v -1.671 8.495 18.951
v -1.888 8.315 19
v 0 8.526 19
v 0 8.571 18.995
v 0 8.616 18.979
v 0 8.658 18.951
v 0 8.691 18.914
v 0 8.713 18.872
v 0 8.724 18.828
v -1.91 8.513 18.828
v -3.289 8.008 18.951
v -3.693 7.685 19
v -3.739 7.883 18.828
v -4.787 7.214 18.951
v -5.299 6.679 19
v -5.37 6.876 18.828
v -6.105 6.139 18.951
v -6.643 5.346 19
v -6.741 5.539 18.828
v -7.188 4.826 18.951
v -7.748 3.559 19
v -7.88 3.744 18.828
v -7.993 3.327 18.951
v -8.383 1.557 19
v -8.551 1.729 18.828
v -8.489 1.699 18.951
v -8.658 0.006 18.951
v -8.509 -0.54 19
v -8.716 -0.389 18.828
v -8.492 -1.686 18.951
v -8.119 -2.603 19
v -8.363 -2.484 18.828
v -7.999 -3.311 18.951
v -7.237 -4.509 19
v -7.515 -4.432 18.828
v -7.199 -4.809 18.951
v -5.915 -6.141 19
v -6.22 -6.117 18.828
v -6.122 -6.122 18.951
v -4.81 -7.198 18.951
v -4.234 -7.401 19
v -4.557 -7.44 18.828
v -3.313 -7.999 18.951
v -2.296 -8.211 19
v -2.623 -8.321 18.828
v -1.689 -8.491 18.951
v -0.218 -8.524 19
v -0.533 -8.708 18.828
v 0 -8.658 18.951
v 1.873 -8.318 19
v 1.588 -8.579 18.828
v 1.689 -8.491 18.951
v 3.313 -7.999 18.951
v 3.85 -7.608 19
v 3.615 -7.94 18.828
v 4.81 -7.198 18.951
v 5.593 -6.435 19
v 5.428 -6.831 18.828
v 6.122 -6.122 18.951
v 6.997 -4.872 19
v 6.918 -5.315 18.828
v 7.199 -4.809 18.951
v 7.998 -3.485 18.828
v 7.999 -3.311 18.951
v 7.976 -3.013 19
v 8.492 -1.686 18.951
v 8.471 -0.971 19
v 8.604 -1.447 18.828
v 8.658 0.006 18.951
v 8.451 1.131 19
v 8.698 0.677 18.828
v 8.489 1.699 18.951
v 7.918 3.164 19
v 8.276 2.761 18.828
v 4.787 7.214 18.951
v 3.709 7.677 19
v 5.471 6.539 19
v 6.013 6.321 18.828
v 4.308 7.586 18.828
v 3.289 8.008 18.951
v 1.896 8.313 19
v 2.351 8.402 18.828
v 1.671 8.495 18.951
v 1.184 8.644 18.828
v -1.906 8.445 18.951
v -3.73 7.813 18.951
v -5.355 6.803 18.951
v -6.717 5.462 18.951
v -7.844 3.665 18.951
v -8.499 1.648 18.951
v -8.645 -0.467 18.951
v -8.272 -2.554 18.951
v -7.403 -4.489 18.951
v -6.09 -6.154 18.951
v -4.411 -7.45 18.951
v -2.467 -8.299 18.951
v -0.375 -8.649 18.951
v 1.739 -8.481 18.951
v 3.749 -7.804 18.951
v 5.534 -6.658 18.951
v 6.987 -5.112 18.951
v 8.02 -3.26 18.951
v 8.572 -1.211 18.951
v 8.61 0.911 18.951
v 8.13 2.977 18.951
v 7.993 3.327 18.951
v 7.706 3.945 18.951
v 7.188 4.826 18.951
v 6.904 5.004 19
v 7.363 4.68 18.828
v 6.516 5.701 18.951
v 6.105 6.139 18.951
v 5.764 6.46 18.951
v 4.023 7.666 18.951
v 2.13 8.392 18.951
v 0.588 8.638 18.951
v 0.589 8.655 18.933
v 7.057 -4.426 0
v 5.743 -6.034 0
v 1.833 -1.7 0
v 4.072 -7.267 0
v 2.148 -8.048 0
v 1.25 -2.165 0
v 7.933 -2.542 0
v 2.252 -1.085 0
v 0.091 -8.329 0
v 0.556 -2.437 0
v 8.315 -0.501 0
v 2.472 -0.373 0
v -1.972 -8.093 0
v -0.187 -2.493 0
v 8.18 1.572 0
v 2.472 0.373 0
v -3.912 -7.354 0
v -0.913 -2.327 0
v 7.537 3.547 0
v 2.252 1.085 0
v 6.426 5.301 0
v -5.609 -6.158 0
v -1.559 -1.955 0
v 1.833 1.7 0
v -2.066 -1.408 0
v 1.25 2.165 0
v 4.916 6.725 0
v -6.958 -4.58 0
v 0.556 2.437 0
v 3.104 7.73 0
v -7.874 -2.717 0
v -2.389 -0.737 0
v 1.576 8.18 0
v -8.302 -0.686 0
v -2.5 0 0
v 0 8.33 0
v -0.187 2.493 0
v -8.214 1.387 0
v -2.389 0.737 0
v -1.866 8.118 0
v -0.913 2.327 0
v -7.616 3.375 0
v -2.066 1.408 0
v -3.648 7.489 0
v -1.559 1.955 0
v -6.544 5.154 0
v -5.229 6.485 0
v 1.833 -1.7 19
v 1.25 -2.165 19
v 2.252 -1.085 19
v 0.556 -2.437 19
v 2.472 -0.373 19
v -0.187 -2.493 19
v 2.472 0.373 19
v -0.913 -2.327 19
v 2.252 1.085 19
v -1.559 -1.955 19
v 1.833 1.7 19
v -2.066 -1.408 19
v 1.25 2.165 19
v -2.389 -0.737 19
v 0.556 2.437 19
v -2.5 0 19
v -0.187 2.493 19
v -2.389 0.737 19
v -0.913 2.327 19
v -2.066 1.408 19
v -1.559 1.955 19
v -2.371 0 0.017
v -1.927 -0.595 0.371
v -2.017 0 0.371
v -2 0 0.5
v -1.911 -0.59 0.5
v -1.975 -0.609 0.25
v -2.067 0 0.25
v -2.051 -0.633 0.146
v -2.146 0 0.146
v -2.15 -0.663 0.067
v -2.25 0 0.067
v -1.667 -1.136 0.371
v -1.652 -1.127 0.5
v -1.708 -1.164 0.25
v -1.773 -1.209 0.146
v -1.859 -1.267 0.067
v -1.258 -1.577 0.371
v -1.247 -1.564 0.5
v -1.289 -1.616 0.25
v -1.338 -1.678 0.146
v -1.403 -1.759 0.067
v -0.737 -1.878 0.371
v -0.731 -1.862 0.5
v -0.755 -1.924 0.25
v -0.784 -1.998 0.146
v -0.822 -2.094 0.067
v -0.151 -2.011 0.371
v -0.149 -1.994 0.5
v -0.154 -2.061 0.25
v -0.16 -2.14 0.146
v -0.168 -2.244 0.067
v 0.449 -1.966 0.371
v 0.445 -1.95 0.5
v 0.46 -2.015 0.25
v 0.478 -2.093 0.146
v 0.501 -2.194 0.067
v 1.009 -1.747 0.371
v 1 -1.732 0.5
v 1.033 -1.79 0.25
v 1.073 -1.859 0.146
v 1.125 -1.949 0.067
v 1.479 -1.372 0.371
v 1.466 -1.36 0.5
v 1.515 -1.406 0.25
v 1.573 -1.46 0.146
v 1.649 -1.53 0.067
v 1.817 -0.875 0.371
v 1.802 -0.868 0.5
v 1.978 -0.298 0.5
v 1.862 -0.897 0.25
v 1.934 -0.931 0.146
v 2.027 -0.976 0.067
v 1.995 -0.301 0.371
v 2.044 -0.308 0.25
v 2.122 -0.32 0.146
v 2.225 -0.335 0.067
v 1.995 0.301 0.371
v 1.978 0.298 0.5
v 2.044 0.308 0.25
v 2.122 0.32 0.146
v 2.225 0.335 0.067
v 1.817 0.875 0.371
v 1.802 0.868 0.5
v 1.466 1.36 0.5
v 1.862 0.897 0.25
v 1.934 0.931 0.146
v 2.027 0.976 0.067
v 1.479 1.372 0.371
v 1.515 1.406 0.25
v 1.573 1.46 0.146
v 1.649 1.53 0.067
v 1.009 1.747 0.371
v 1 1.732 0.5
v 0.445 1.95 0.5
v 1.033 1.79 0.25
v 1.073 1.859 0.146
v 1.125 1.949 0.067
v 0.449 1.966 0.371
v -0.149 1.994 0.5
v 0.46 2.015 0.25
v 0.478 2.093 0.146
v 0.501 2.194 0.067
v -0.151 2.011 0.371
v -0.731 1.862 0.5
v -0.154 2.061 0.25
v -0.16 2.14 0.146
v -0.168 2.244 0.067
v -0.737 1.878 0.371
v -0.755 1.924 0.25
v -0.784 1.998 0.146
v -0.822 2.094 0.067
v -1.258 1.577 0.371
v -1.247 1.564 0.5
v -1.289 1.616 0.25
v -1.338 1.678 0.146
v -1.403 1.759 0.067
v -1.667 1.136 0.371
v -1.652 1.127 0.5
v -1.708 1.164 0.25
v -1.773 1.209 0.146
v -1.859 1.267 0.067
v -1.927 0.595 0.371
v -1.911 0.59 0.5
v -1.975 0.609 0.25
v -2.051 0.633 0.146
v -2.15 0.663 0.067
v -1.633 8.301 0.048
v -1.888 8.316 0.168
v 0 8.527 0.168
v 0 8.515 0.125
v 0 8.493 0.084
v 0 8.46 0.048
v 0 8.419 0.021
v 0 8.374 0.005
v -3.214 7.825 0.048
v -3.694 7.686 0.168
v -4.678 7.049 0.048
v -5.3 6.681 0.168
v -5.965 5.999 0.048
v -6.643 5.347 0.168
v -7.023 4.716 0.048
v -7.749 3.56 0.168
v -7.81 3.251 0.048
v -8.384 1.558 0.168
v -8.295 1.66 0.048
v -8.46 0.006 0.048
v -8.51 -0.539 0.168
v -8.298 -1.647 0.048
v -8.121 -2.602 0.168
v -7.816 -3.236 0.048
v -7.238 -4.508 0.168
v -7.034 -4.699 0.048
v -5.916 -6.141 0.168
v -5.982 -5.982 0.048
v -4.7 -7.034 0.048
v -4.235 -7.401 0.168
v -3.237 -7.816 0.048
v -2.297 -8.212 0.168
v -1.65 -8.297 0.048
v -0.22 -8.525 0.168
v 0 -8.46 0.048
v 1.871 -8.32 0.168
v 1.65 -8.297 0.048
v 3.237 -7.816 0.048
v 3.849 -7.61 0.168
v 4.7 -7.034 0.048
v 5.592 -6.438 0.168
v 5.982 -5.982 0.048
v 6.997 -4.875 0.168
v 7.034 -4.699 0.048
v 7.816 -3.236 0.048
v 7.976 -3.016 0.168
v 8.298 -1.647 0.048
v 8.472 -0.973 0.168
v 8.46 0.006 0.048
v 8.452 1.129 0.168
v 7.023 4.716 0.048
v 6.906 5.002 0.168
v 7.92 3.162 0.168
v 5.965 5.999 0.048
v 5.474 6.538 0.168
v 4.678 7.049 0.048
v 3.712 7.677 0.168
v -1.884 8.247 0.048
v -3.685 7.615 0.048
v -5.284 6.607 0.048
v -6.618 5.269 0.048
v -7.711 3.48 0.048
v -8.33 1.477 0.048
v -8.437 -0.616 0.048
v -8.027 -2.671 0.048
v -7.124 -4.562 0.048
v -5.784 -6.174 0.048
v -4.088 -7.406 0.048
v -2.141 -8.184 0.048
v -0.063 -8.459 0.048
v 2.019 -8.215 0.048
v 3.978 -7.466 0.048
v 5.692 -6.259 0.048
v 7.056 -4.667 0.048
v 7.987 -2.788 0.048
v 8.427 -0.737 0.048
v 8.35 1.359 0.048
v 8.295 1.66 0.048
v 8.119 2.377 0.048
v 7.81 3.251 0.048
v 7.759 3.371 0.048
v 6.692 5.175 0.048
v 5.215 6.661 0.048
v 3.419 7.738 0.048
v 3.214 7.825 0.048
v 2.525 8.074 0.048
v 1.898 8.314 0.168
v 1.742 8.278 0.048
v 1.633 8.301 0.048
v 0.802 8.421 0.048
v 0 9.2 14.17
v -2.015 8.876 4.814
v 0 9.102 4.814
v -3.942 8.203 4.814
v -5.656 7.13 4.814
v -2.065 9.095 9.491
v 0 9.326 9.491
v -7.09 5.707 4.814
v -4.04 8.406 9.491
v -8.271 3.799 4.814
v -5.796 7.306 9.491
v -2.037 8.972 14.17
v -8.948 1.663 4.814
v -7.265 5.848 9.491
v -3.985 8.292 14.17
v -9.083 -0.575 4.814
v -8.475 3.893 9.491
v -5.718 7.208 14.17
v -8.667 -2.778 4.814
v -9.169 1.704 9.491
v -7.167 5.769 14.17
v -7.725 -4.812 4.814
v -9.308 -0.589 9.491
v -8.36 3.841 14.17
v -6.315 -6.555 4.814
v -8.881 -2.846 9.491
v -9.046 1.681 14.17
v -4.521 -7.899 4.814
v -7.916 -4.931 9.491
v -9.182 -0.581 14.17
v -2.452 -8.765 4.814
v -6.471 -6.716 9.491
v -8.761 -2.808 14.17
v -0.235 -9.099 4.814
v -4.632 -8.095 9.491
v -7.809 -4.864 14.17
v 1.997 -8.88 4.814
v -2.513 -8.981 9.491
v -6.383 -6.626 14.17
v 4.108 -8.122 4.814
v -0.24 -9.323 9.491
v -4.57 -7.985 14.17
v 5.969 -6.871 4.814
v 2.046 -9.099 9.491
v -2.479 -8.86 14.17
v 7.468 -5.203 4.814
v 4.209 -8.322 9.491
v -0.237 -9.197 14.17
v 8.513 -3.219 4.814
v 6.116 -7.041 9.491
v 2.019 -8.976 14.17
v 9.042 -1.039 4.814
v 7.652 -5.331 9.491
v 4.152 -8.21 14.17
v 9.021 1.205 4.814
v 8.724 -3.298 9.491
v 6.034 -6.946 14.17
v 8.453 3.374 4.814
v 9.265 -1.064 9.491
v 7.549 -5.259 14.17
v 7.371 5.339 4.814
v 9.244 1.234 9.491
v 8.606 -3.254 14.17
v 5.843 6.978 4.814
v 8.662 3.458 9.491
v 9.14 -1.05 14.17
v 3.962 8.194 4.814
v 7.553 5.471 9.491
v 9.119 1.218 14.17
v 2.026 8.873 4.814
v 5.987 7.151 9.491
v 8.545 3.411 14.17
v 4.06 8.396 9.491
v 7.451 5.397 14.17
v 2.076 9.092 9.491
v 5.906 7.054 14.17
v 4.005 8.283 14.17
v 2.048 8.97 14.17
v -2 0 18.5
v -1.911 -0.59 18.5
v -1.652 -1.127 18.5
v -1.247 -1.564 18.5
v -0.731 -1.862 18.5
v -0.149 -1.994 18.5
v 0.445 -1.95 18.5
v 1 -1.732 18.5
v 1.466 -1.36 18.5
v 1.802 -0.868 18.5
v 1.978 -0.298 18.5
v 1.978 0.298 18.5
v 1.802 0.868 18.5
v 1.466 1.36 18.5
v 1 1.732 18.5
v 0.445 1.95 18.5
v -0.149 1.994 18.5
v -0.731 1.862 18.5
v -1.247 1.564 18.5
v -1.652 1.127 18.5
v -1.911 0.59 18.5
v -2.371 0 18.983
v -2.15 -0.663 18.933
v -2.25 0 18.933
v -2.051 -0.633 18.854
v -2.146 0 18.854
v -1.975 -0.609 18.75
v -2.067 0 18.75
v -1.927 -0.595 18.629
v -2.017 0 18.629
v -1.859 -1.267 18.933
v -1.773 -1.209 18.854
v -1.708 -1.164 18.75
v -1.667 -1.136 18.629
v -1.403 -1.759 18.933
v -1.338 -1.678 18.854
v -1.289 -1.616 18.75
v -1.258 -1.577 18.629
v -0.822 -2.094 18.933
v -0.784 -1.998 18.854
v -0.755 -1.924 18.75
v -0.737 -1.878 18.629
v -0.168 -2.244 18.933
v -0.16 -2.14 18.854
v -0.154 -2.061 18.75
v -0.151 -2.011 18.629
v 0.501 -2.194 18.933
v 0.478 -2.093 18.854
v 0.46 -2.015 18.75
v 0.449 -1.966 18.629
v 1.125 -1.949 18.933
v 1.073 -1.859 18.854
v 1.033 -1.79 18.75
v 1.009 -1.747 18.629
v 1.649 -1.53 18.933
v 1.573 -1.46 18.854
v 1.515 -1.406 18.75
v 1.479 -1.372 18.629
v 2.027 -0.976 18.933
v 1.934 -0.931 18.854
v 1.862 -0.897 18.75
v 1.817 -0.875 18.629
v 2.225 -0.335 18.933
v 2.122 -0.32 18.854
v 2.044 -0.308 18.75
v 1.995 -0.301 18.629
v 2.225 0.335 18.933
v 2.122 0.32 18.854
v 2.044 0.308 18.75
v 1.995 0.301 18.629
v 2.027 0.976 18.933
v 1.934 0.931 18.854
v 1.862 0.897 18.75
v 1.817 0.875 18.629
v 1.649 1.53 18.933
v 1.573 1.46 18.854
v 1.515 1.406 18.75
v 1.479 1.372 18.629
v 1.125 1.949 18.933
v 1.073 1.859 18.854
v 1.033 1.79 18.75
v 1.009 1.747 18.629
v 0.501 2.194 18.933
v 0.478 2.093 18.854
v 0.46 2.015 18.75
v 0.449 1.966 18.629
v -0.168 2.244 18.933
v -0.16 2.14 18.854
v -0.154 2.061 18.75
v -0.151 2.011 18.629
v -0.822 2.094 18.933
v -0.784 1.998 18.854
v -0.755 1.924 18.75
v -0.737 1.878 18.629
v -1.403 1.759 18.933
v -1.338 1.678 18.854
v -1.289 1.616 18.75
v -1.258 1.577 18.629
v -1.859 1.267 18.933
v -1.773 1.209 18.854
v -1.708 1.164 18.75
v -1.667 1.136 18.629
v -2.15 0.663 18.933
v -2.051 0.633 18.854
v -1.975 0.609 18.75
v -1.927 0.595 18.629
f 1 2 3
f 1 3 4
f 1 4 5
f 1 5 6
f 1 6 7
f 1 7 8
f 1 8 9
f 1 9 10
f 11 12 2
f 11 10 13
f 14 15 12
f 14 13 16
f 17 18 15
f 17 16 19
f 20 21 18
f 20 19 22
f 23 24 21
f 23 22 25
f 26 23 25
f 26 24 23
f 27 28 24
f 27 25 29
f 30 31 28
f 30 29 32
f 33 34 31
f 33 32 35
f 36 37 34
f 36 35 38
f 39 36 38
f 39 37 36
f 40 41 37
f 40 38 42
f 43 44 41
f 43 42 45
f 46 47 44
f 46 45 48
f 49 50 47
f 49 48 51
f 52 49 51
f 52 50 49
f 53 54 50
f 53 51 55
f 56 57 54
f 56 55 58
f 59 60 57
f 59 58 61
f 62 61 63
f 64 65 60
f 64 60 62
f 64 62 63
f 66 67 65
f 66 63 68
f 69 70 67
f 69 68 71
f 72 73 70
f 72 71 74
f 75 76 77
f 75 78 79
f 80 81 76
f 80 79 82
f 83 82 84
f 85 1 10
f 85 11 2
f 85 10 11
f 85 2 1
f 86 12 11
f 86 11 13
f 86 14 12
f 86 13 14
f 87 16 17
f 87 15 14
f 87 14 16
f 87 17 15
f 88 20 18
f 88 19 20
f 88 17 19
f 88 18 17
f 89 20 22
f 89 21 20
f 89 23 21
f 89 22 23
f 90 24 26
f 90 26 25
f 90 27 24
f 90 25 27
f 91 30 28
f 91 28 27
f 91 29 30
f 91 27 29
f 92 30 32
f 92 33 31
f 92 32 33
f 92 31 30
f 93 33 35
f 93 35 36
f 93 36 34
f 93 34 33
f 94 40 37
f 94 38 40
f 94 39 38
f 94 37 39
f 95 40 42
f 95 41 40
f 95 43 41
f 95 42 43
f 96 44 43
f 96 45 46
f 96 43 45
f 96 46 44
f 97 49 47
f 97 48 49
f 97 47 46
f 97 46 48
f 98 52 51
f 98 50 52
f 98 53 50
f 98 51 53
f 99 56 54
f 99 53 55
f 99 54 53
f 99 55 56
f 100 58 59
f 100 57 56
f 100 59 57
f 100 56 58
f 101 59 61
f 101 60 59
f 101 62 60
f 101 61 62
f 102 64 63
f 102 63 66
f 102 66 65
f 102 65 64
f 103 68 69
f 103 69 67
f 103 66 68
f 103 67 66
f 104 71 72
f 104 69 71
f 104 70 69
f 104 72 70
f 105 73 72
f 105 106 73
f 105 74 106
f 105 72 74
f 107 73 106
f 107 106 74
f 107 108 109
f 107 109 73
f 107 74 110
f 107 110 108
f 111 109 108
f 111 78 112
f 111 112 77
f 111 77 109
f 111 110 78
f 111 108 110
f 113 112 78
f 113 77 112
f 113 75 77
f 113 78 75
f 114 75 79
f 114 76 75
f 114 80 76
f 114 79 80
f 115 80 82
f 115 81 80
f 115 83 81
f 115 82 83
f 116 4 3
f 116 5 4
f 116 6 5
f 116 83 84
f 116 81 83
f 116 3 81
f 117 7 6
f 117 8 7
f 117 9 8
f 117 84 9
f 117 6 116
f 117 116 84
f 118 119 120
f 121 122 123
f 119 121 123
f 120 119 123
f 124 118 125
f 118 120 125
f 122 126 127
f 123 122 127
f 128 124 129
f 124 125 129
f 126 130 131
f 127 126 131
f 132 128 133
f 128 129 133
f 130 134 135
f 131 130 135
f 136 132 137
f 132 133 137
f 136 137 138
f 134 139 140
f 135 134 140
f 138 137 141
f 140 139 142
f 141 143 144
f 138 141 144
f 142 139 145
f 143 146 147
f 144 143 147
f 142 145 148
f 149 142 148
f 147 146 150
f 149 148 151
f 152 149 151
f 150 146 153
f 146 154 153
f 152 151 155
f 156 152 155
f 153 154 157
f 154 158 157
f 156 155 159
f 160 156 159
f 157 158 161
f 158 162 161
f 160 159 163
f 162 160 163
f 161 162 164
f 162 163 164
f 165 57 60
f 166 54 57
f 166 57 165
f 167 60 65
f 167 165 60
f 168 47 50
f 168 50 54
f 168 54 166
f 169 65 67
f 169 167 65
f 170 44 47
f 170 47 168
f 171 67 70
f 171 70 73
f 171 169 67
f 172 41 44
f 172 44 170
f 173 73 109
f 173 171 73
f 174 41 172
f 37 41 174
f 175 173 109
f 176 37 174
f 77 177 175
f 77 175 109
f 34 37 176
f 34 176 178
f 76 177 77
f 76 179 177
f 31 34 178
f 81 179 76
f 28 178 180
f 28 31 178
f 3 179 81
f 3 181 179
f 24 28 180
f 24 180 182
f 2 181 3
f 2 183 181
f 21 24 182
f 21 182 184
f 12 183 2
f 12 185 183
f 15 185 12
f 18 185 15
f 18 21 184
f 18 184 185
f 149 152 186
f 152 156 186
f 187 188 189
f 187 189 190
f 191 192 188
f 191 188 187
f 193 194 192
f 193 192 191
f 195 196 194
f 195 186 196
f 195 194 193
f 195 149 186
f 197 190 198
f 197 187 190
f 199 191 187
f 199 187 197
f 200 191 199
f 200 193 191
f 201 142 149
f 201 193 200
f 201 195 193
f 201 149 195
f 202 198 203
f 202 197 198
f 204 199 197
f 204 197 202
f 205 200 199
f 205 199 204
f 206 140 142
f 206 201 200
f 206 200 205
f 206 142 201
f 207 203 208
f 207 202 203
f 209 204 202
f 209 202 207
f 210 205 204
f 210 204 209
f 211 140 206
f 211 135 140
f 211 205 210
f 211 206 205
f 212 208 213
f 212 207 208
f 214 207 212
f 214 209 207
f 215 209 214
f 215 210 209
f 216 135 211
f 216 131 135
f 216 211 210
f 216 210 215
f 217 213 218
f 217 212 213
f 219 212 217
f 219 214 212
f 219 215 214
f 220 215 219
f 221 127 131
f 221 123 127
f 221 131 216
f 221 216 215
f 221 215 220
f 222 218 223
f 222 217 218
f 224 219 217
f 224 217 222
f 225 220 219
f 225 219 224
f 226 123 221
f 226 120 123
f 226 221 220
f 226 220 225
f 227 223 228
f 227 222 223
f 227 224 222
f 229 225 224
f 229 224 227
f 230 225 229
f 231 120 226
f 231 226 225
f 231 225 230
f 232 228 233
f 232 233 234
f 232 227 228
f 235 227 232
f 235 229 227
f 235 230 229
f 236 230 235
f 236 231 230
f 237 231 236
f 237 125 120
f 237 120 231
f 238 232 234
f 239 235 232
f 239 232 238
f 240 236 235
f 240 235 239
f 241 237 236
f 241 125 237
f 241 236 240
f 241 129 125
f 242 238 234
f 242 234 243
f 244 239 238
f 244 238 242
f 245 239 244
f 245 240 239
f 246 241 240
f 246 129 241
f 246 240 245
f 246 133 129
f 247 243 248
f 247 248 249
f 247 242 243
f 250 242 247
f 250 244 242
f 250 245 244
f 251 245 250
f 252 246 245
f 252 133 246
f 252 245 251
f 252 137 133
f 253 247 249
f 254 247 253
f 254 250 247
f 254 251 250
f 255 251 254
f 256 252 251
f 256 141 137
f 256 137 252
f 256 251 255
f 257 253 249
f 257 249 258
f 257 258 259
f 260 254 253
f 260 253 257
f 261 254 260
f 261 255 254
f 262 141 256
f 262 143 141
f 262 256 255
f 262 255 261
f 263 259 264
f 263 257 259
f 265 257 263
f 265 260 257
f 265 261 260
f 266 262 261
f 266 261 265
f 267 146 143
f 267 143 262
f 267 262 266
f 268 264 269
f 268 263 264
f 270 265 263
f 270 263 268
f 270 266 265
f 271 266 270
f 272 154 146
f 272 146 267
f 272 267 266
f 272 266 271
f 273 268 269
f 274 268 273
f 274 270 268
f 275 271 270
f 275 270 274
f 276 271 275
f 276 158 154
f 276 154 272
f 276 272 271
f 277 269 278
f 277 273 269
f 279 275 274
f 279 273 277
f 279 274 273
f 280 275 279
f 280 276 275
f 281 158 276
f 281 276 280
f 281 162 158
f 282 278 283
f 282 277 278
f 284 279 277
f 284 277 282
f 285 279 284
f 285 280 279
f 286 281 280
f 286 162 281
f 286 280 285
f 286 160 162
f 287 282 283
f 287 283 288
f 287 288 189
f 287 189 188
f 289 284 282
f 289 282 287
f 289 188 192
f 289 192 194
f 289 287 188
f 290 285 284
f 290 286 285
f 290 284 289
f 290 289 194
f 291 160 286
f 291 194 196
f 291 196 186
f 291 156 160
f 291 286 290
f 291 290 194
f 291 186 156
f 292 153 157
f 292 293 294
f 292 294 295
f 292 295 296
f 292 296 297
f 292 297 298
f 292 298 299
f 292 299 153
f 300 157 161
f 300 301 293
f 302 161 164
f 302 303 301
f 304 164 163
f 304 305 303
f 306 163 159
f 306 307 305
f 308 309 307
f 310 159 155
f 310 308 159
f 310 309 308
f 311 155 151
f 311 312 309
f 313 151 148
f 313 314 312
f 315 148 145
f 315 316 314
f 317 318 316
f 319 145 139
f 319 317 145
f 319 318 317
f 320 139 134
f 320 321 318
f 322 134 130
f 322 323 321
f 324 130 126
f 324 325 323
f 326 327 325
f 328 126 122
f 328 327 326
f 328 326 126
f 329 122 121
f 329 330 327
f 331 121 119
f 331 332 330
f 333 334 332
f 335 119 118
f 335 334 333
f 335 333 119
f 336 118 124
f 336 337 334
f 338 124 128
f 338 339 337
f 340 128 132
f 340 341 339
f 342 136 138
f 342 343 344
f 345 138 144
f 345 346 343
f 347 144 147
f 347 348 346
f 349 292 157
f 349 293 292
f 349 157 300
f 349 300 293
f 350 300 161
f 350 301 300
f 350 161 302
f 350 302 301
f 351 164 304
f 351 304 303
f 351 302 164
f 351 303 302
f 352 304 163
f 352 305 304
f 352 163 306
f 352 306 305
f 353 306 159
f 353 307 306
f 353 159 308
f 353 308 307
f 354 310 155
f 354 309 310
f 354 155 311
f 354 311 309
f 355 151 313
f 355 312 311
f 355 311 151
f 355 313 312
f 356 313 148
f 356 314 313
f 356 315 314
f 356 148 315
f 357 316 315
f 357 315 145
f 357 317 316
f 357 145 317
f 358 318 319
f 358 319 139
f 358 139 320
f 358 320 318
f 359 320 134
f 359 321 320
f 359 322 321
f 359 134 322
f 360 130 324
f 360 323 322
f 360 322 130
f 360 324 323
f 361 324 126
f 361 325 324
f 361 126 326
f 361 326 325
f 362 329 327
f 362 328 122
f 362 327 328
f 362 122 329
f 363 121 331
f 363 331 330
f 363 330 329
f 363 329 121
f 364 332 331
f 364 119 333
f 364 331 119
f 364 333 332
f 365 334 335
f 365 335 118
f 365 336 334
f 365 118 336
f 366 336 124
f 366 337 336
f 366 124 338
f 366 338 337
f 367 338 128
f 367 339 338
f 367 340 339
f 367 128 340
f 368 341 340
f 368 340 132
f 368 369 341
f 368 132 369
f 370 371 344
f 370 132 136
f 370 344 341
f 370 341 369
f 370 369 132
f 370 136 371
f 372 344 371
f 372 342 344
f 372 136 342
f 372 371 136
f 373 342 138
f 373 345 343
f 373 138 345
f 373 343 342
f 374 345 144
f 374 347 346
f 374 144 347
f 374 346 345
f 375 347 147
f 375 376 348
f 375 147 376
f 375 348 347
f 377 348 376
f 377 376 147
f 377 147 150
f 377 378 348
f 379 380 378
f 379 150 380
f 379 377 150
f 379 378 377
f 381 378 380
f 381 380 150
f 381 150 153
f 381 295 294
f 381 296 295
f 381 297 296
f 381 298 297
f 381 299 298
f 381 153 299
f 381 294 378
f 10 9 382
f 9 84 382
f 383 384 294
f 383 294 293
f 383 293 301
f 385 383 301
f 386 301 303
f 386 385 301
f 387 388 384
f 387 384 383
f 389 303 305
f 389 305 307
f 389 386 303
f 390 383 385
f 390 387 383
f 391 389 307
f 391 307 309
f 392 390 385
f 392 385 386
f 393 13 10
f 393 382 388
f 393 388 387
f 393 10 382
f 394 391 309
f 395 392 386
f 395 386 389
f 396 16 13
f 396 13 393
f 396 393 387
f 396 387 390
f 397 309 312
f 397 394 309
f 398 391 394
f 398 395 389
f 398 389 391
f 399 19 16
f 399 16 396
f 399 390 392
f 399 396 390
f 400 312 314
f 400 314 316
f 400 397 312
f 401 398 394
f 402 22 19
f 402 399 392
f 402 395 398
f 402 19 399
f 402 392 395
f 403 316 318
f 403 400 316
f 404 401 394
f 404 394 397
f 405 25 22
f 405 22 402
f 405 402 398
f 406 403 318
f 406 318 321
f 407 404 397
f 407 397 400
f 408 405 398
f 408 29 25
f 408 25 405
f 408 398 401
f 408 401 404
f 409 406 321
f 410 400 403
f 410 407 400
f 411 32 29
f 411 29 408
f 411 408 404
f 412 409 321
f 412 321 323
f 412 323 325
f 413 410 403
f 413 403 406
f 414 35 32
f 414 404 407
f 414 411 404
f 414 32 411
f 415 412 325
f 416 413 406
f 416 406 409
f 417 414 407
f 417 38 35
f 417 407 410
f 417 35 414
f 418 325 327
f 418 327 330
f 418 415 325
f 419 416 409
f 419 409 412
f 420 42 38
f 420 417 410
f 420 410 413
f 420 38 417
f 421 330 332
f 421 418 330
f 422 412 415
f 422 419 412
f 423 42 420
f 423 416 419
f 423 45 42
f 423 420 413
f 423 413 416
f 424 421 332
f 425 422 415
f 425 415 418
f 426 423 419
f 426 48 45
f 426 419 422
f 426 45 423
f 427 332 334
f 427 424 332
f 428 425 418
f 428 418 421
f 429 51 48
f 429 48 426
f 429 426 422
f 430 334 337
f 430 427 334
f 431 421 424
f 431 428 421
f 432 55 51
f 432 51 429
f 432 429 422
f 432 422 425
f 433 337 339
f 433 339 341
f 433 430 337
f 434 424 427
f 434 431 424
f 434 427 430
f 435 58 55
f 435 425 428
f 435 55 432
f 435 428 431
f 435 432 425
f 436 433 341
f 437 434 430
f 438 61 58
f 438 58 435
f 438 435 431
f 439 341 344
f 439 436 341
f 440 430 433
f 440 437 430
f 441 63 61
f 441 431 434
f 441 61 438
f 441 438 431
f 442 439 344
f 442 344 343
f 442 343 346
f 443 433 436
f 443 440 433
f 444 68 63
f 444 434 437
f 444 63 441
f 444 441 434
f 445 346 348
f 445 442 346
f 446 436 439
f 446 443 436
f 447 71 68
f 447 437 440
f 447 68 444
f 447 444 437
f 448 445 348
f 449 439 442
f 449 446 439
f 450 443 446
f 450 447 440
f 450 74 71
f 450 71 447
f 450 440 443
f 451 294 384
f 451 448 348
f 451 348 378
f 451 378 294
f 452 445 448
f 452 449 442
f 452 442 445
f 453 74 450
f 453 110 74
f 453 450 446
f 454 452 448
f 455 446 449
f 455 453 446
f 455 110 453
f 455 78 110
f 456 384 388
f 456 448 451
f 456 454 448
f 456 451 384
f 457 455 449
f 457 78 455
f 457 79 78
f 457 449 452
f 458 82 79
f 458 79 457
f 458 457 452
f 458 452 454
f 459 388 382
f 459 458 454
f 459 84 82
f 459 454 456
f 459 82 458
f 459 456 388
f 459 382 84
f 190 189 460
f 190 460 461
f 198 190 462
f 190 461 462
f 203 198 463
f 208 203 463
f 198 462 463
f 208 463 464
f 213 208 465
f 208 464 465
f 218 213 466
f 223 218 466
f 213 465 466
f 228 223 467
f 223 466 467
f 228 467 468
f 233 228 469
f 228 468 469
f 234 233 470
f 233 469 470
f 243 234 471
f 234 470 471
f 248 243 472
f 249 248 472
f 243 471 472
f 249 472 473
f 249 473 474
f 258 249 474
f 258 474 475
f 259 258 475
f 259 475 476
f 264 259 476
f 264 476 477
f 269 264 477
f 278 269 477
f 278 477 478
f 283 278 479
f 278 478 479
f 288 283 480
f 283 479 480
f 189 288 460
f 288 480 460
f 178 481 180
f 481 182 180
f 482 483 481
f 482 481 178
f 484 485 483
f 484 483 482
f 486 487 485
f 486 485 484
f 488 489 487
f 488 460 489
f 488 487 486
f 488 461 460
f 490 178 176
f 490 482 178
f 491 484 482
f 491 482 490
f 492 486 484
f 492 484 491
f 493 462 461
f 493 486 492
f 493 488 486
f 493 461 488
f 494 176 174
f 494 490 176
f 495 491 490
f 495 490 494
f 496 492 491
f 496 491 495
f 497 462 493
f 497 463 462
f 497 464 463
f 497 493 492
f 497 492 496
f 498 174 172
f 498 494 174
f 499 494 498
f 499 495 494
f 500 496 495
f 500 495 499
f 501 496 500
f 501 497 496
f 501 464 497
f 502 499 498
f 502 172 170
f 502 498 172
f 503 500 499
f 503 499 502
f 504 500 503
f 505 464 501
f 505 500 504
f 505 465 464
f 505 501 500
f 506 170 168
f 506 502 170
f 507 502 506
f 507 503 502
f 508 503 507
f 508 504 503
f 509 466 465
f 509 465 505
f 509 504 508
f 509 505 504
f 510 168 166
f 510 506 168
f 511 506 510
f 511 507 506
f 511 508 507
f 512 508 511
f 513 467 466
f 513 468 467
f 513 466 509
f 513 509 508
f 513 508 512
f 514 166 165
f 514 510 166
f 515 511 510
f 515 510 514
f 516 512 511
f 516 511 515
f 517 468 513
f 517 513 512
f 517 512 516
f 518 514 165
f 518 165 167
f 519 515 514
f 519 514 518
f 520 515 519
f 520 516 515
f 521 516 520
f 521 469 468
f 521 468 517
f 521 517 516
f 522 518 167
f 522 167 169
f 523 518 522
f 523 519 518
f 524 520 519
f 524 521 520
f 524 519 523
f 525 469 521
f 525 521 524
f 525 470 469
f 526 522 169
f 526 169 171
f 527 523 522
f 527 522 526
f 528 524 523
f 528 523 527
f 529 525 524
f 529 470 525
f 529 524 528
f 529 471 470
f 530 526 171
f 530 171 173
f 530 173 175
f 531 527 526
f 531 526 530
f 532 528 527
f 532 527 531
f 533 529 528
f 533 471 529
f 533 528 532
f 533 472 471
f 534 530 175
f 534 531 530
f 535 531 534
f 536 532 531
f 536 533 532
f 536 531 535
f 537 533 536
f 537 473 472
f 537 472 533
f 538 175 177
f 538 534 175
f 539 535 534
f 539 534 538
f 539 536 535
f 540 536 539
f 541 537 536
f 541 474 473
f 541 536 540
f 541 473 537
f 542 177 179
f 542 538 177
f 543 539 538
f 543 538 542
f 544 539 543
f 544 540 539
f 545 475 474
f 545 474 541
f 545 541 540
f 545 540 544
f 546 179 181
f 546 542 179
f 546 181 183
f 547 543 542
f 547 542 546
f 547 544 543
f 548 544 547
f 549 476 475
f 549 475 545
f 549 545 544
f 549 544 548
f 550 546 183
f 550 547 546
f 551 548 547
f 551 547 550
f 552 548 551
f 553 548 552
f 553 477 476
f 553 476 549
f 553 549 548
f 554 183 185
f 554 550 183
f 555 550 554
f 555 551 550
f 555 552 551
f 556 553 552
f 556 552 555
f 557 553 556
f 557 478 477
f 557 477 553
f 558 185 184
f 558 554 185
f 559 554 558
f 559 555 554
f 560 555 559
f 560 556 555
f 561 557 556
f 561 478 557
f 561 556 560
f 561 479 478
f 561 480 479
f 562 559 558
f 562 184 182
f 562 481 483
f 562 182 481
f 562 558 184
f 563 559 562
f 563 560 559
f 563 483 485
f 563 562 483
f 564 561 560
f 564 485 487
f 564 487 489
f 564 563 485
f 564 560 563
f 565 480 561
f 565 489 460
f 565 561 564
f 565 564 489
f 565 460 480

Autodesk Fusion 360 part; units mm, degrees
sketch "Esboço1" plane through (0, 0, 0) normal (1, 0, 0) x (0, 1, 0)
  line L0 (0, 0) -> (8.5, 0)
  line L1 (0, 0) -> (0, 19)
  line L2 (0, 19) -> (8.7, 19)
  arc A0 (8.5, 0) -> (8.7, 19) centre (-53.1703, 10.1502) ccw
  line L3 (8.5, 0) -> (8.5, 10.6447)
  dimension "d1" = 8.5
  dimension "d2" = 19
  dimension "d3" = 8.7
  dimension "d5" = 125
revolve "Revolucionar1" add sketch "Esboço1" angle 360 about axis through (0, 0, 0) along (0, 0, 1)
sketch "Esboço2" plane through (0, 0, 19) normal (0, 0, 1) x (-1, 0, 0)
  circle A0 centre (0, 0) radius 8.7
  circle A1 centre (0, 0) radius 2
  dimension "d7" = 4
extrude "Extrusão1" cut sketch "Esboço2" against normal blind 24 contours A1
fillet "Arredondamento1" radius 0.5 2 edges at (1.8647, -0.7232, 19) (1.8647, 0.7232, 0)
fillet "Arredondamento2" radius 0.2 2 edges at (-8.1112, 3.1461, 19) (-7.9248, 3.0737, 0)
